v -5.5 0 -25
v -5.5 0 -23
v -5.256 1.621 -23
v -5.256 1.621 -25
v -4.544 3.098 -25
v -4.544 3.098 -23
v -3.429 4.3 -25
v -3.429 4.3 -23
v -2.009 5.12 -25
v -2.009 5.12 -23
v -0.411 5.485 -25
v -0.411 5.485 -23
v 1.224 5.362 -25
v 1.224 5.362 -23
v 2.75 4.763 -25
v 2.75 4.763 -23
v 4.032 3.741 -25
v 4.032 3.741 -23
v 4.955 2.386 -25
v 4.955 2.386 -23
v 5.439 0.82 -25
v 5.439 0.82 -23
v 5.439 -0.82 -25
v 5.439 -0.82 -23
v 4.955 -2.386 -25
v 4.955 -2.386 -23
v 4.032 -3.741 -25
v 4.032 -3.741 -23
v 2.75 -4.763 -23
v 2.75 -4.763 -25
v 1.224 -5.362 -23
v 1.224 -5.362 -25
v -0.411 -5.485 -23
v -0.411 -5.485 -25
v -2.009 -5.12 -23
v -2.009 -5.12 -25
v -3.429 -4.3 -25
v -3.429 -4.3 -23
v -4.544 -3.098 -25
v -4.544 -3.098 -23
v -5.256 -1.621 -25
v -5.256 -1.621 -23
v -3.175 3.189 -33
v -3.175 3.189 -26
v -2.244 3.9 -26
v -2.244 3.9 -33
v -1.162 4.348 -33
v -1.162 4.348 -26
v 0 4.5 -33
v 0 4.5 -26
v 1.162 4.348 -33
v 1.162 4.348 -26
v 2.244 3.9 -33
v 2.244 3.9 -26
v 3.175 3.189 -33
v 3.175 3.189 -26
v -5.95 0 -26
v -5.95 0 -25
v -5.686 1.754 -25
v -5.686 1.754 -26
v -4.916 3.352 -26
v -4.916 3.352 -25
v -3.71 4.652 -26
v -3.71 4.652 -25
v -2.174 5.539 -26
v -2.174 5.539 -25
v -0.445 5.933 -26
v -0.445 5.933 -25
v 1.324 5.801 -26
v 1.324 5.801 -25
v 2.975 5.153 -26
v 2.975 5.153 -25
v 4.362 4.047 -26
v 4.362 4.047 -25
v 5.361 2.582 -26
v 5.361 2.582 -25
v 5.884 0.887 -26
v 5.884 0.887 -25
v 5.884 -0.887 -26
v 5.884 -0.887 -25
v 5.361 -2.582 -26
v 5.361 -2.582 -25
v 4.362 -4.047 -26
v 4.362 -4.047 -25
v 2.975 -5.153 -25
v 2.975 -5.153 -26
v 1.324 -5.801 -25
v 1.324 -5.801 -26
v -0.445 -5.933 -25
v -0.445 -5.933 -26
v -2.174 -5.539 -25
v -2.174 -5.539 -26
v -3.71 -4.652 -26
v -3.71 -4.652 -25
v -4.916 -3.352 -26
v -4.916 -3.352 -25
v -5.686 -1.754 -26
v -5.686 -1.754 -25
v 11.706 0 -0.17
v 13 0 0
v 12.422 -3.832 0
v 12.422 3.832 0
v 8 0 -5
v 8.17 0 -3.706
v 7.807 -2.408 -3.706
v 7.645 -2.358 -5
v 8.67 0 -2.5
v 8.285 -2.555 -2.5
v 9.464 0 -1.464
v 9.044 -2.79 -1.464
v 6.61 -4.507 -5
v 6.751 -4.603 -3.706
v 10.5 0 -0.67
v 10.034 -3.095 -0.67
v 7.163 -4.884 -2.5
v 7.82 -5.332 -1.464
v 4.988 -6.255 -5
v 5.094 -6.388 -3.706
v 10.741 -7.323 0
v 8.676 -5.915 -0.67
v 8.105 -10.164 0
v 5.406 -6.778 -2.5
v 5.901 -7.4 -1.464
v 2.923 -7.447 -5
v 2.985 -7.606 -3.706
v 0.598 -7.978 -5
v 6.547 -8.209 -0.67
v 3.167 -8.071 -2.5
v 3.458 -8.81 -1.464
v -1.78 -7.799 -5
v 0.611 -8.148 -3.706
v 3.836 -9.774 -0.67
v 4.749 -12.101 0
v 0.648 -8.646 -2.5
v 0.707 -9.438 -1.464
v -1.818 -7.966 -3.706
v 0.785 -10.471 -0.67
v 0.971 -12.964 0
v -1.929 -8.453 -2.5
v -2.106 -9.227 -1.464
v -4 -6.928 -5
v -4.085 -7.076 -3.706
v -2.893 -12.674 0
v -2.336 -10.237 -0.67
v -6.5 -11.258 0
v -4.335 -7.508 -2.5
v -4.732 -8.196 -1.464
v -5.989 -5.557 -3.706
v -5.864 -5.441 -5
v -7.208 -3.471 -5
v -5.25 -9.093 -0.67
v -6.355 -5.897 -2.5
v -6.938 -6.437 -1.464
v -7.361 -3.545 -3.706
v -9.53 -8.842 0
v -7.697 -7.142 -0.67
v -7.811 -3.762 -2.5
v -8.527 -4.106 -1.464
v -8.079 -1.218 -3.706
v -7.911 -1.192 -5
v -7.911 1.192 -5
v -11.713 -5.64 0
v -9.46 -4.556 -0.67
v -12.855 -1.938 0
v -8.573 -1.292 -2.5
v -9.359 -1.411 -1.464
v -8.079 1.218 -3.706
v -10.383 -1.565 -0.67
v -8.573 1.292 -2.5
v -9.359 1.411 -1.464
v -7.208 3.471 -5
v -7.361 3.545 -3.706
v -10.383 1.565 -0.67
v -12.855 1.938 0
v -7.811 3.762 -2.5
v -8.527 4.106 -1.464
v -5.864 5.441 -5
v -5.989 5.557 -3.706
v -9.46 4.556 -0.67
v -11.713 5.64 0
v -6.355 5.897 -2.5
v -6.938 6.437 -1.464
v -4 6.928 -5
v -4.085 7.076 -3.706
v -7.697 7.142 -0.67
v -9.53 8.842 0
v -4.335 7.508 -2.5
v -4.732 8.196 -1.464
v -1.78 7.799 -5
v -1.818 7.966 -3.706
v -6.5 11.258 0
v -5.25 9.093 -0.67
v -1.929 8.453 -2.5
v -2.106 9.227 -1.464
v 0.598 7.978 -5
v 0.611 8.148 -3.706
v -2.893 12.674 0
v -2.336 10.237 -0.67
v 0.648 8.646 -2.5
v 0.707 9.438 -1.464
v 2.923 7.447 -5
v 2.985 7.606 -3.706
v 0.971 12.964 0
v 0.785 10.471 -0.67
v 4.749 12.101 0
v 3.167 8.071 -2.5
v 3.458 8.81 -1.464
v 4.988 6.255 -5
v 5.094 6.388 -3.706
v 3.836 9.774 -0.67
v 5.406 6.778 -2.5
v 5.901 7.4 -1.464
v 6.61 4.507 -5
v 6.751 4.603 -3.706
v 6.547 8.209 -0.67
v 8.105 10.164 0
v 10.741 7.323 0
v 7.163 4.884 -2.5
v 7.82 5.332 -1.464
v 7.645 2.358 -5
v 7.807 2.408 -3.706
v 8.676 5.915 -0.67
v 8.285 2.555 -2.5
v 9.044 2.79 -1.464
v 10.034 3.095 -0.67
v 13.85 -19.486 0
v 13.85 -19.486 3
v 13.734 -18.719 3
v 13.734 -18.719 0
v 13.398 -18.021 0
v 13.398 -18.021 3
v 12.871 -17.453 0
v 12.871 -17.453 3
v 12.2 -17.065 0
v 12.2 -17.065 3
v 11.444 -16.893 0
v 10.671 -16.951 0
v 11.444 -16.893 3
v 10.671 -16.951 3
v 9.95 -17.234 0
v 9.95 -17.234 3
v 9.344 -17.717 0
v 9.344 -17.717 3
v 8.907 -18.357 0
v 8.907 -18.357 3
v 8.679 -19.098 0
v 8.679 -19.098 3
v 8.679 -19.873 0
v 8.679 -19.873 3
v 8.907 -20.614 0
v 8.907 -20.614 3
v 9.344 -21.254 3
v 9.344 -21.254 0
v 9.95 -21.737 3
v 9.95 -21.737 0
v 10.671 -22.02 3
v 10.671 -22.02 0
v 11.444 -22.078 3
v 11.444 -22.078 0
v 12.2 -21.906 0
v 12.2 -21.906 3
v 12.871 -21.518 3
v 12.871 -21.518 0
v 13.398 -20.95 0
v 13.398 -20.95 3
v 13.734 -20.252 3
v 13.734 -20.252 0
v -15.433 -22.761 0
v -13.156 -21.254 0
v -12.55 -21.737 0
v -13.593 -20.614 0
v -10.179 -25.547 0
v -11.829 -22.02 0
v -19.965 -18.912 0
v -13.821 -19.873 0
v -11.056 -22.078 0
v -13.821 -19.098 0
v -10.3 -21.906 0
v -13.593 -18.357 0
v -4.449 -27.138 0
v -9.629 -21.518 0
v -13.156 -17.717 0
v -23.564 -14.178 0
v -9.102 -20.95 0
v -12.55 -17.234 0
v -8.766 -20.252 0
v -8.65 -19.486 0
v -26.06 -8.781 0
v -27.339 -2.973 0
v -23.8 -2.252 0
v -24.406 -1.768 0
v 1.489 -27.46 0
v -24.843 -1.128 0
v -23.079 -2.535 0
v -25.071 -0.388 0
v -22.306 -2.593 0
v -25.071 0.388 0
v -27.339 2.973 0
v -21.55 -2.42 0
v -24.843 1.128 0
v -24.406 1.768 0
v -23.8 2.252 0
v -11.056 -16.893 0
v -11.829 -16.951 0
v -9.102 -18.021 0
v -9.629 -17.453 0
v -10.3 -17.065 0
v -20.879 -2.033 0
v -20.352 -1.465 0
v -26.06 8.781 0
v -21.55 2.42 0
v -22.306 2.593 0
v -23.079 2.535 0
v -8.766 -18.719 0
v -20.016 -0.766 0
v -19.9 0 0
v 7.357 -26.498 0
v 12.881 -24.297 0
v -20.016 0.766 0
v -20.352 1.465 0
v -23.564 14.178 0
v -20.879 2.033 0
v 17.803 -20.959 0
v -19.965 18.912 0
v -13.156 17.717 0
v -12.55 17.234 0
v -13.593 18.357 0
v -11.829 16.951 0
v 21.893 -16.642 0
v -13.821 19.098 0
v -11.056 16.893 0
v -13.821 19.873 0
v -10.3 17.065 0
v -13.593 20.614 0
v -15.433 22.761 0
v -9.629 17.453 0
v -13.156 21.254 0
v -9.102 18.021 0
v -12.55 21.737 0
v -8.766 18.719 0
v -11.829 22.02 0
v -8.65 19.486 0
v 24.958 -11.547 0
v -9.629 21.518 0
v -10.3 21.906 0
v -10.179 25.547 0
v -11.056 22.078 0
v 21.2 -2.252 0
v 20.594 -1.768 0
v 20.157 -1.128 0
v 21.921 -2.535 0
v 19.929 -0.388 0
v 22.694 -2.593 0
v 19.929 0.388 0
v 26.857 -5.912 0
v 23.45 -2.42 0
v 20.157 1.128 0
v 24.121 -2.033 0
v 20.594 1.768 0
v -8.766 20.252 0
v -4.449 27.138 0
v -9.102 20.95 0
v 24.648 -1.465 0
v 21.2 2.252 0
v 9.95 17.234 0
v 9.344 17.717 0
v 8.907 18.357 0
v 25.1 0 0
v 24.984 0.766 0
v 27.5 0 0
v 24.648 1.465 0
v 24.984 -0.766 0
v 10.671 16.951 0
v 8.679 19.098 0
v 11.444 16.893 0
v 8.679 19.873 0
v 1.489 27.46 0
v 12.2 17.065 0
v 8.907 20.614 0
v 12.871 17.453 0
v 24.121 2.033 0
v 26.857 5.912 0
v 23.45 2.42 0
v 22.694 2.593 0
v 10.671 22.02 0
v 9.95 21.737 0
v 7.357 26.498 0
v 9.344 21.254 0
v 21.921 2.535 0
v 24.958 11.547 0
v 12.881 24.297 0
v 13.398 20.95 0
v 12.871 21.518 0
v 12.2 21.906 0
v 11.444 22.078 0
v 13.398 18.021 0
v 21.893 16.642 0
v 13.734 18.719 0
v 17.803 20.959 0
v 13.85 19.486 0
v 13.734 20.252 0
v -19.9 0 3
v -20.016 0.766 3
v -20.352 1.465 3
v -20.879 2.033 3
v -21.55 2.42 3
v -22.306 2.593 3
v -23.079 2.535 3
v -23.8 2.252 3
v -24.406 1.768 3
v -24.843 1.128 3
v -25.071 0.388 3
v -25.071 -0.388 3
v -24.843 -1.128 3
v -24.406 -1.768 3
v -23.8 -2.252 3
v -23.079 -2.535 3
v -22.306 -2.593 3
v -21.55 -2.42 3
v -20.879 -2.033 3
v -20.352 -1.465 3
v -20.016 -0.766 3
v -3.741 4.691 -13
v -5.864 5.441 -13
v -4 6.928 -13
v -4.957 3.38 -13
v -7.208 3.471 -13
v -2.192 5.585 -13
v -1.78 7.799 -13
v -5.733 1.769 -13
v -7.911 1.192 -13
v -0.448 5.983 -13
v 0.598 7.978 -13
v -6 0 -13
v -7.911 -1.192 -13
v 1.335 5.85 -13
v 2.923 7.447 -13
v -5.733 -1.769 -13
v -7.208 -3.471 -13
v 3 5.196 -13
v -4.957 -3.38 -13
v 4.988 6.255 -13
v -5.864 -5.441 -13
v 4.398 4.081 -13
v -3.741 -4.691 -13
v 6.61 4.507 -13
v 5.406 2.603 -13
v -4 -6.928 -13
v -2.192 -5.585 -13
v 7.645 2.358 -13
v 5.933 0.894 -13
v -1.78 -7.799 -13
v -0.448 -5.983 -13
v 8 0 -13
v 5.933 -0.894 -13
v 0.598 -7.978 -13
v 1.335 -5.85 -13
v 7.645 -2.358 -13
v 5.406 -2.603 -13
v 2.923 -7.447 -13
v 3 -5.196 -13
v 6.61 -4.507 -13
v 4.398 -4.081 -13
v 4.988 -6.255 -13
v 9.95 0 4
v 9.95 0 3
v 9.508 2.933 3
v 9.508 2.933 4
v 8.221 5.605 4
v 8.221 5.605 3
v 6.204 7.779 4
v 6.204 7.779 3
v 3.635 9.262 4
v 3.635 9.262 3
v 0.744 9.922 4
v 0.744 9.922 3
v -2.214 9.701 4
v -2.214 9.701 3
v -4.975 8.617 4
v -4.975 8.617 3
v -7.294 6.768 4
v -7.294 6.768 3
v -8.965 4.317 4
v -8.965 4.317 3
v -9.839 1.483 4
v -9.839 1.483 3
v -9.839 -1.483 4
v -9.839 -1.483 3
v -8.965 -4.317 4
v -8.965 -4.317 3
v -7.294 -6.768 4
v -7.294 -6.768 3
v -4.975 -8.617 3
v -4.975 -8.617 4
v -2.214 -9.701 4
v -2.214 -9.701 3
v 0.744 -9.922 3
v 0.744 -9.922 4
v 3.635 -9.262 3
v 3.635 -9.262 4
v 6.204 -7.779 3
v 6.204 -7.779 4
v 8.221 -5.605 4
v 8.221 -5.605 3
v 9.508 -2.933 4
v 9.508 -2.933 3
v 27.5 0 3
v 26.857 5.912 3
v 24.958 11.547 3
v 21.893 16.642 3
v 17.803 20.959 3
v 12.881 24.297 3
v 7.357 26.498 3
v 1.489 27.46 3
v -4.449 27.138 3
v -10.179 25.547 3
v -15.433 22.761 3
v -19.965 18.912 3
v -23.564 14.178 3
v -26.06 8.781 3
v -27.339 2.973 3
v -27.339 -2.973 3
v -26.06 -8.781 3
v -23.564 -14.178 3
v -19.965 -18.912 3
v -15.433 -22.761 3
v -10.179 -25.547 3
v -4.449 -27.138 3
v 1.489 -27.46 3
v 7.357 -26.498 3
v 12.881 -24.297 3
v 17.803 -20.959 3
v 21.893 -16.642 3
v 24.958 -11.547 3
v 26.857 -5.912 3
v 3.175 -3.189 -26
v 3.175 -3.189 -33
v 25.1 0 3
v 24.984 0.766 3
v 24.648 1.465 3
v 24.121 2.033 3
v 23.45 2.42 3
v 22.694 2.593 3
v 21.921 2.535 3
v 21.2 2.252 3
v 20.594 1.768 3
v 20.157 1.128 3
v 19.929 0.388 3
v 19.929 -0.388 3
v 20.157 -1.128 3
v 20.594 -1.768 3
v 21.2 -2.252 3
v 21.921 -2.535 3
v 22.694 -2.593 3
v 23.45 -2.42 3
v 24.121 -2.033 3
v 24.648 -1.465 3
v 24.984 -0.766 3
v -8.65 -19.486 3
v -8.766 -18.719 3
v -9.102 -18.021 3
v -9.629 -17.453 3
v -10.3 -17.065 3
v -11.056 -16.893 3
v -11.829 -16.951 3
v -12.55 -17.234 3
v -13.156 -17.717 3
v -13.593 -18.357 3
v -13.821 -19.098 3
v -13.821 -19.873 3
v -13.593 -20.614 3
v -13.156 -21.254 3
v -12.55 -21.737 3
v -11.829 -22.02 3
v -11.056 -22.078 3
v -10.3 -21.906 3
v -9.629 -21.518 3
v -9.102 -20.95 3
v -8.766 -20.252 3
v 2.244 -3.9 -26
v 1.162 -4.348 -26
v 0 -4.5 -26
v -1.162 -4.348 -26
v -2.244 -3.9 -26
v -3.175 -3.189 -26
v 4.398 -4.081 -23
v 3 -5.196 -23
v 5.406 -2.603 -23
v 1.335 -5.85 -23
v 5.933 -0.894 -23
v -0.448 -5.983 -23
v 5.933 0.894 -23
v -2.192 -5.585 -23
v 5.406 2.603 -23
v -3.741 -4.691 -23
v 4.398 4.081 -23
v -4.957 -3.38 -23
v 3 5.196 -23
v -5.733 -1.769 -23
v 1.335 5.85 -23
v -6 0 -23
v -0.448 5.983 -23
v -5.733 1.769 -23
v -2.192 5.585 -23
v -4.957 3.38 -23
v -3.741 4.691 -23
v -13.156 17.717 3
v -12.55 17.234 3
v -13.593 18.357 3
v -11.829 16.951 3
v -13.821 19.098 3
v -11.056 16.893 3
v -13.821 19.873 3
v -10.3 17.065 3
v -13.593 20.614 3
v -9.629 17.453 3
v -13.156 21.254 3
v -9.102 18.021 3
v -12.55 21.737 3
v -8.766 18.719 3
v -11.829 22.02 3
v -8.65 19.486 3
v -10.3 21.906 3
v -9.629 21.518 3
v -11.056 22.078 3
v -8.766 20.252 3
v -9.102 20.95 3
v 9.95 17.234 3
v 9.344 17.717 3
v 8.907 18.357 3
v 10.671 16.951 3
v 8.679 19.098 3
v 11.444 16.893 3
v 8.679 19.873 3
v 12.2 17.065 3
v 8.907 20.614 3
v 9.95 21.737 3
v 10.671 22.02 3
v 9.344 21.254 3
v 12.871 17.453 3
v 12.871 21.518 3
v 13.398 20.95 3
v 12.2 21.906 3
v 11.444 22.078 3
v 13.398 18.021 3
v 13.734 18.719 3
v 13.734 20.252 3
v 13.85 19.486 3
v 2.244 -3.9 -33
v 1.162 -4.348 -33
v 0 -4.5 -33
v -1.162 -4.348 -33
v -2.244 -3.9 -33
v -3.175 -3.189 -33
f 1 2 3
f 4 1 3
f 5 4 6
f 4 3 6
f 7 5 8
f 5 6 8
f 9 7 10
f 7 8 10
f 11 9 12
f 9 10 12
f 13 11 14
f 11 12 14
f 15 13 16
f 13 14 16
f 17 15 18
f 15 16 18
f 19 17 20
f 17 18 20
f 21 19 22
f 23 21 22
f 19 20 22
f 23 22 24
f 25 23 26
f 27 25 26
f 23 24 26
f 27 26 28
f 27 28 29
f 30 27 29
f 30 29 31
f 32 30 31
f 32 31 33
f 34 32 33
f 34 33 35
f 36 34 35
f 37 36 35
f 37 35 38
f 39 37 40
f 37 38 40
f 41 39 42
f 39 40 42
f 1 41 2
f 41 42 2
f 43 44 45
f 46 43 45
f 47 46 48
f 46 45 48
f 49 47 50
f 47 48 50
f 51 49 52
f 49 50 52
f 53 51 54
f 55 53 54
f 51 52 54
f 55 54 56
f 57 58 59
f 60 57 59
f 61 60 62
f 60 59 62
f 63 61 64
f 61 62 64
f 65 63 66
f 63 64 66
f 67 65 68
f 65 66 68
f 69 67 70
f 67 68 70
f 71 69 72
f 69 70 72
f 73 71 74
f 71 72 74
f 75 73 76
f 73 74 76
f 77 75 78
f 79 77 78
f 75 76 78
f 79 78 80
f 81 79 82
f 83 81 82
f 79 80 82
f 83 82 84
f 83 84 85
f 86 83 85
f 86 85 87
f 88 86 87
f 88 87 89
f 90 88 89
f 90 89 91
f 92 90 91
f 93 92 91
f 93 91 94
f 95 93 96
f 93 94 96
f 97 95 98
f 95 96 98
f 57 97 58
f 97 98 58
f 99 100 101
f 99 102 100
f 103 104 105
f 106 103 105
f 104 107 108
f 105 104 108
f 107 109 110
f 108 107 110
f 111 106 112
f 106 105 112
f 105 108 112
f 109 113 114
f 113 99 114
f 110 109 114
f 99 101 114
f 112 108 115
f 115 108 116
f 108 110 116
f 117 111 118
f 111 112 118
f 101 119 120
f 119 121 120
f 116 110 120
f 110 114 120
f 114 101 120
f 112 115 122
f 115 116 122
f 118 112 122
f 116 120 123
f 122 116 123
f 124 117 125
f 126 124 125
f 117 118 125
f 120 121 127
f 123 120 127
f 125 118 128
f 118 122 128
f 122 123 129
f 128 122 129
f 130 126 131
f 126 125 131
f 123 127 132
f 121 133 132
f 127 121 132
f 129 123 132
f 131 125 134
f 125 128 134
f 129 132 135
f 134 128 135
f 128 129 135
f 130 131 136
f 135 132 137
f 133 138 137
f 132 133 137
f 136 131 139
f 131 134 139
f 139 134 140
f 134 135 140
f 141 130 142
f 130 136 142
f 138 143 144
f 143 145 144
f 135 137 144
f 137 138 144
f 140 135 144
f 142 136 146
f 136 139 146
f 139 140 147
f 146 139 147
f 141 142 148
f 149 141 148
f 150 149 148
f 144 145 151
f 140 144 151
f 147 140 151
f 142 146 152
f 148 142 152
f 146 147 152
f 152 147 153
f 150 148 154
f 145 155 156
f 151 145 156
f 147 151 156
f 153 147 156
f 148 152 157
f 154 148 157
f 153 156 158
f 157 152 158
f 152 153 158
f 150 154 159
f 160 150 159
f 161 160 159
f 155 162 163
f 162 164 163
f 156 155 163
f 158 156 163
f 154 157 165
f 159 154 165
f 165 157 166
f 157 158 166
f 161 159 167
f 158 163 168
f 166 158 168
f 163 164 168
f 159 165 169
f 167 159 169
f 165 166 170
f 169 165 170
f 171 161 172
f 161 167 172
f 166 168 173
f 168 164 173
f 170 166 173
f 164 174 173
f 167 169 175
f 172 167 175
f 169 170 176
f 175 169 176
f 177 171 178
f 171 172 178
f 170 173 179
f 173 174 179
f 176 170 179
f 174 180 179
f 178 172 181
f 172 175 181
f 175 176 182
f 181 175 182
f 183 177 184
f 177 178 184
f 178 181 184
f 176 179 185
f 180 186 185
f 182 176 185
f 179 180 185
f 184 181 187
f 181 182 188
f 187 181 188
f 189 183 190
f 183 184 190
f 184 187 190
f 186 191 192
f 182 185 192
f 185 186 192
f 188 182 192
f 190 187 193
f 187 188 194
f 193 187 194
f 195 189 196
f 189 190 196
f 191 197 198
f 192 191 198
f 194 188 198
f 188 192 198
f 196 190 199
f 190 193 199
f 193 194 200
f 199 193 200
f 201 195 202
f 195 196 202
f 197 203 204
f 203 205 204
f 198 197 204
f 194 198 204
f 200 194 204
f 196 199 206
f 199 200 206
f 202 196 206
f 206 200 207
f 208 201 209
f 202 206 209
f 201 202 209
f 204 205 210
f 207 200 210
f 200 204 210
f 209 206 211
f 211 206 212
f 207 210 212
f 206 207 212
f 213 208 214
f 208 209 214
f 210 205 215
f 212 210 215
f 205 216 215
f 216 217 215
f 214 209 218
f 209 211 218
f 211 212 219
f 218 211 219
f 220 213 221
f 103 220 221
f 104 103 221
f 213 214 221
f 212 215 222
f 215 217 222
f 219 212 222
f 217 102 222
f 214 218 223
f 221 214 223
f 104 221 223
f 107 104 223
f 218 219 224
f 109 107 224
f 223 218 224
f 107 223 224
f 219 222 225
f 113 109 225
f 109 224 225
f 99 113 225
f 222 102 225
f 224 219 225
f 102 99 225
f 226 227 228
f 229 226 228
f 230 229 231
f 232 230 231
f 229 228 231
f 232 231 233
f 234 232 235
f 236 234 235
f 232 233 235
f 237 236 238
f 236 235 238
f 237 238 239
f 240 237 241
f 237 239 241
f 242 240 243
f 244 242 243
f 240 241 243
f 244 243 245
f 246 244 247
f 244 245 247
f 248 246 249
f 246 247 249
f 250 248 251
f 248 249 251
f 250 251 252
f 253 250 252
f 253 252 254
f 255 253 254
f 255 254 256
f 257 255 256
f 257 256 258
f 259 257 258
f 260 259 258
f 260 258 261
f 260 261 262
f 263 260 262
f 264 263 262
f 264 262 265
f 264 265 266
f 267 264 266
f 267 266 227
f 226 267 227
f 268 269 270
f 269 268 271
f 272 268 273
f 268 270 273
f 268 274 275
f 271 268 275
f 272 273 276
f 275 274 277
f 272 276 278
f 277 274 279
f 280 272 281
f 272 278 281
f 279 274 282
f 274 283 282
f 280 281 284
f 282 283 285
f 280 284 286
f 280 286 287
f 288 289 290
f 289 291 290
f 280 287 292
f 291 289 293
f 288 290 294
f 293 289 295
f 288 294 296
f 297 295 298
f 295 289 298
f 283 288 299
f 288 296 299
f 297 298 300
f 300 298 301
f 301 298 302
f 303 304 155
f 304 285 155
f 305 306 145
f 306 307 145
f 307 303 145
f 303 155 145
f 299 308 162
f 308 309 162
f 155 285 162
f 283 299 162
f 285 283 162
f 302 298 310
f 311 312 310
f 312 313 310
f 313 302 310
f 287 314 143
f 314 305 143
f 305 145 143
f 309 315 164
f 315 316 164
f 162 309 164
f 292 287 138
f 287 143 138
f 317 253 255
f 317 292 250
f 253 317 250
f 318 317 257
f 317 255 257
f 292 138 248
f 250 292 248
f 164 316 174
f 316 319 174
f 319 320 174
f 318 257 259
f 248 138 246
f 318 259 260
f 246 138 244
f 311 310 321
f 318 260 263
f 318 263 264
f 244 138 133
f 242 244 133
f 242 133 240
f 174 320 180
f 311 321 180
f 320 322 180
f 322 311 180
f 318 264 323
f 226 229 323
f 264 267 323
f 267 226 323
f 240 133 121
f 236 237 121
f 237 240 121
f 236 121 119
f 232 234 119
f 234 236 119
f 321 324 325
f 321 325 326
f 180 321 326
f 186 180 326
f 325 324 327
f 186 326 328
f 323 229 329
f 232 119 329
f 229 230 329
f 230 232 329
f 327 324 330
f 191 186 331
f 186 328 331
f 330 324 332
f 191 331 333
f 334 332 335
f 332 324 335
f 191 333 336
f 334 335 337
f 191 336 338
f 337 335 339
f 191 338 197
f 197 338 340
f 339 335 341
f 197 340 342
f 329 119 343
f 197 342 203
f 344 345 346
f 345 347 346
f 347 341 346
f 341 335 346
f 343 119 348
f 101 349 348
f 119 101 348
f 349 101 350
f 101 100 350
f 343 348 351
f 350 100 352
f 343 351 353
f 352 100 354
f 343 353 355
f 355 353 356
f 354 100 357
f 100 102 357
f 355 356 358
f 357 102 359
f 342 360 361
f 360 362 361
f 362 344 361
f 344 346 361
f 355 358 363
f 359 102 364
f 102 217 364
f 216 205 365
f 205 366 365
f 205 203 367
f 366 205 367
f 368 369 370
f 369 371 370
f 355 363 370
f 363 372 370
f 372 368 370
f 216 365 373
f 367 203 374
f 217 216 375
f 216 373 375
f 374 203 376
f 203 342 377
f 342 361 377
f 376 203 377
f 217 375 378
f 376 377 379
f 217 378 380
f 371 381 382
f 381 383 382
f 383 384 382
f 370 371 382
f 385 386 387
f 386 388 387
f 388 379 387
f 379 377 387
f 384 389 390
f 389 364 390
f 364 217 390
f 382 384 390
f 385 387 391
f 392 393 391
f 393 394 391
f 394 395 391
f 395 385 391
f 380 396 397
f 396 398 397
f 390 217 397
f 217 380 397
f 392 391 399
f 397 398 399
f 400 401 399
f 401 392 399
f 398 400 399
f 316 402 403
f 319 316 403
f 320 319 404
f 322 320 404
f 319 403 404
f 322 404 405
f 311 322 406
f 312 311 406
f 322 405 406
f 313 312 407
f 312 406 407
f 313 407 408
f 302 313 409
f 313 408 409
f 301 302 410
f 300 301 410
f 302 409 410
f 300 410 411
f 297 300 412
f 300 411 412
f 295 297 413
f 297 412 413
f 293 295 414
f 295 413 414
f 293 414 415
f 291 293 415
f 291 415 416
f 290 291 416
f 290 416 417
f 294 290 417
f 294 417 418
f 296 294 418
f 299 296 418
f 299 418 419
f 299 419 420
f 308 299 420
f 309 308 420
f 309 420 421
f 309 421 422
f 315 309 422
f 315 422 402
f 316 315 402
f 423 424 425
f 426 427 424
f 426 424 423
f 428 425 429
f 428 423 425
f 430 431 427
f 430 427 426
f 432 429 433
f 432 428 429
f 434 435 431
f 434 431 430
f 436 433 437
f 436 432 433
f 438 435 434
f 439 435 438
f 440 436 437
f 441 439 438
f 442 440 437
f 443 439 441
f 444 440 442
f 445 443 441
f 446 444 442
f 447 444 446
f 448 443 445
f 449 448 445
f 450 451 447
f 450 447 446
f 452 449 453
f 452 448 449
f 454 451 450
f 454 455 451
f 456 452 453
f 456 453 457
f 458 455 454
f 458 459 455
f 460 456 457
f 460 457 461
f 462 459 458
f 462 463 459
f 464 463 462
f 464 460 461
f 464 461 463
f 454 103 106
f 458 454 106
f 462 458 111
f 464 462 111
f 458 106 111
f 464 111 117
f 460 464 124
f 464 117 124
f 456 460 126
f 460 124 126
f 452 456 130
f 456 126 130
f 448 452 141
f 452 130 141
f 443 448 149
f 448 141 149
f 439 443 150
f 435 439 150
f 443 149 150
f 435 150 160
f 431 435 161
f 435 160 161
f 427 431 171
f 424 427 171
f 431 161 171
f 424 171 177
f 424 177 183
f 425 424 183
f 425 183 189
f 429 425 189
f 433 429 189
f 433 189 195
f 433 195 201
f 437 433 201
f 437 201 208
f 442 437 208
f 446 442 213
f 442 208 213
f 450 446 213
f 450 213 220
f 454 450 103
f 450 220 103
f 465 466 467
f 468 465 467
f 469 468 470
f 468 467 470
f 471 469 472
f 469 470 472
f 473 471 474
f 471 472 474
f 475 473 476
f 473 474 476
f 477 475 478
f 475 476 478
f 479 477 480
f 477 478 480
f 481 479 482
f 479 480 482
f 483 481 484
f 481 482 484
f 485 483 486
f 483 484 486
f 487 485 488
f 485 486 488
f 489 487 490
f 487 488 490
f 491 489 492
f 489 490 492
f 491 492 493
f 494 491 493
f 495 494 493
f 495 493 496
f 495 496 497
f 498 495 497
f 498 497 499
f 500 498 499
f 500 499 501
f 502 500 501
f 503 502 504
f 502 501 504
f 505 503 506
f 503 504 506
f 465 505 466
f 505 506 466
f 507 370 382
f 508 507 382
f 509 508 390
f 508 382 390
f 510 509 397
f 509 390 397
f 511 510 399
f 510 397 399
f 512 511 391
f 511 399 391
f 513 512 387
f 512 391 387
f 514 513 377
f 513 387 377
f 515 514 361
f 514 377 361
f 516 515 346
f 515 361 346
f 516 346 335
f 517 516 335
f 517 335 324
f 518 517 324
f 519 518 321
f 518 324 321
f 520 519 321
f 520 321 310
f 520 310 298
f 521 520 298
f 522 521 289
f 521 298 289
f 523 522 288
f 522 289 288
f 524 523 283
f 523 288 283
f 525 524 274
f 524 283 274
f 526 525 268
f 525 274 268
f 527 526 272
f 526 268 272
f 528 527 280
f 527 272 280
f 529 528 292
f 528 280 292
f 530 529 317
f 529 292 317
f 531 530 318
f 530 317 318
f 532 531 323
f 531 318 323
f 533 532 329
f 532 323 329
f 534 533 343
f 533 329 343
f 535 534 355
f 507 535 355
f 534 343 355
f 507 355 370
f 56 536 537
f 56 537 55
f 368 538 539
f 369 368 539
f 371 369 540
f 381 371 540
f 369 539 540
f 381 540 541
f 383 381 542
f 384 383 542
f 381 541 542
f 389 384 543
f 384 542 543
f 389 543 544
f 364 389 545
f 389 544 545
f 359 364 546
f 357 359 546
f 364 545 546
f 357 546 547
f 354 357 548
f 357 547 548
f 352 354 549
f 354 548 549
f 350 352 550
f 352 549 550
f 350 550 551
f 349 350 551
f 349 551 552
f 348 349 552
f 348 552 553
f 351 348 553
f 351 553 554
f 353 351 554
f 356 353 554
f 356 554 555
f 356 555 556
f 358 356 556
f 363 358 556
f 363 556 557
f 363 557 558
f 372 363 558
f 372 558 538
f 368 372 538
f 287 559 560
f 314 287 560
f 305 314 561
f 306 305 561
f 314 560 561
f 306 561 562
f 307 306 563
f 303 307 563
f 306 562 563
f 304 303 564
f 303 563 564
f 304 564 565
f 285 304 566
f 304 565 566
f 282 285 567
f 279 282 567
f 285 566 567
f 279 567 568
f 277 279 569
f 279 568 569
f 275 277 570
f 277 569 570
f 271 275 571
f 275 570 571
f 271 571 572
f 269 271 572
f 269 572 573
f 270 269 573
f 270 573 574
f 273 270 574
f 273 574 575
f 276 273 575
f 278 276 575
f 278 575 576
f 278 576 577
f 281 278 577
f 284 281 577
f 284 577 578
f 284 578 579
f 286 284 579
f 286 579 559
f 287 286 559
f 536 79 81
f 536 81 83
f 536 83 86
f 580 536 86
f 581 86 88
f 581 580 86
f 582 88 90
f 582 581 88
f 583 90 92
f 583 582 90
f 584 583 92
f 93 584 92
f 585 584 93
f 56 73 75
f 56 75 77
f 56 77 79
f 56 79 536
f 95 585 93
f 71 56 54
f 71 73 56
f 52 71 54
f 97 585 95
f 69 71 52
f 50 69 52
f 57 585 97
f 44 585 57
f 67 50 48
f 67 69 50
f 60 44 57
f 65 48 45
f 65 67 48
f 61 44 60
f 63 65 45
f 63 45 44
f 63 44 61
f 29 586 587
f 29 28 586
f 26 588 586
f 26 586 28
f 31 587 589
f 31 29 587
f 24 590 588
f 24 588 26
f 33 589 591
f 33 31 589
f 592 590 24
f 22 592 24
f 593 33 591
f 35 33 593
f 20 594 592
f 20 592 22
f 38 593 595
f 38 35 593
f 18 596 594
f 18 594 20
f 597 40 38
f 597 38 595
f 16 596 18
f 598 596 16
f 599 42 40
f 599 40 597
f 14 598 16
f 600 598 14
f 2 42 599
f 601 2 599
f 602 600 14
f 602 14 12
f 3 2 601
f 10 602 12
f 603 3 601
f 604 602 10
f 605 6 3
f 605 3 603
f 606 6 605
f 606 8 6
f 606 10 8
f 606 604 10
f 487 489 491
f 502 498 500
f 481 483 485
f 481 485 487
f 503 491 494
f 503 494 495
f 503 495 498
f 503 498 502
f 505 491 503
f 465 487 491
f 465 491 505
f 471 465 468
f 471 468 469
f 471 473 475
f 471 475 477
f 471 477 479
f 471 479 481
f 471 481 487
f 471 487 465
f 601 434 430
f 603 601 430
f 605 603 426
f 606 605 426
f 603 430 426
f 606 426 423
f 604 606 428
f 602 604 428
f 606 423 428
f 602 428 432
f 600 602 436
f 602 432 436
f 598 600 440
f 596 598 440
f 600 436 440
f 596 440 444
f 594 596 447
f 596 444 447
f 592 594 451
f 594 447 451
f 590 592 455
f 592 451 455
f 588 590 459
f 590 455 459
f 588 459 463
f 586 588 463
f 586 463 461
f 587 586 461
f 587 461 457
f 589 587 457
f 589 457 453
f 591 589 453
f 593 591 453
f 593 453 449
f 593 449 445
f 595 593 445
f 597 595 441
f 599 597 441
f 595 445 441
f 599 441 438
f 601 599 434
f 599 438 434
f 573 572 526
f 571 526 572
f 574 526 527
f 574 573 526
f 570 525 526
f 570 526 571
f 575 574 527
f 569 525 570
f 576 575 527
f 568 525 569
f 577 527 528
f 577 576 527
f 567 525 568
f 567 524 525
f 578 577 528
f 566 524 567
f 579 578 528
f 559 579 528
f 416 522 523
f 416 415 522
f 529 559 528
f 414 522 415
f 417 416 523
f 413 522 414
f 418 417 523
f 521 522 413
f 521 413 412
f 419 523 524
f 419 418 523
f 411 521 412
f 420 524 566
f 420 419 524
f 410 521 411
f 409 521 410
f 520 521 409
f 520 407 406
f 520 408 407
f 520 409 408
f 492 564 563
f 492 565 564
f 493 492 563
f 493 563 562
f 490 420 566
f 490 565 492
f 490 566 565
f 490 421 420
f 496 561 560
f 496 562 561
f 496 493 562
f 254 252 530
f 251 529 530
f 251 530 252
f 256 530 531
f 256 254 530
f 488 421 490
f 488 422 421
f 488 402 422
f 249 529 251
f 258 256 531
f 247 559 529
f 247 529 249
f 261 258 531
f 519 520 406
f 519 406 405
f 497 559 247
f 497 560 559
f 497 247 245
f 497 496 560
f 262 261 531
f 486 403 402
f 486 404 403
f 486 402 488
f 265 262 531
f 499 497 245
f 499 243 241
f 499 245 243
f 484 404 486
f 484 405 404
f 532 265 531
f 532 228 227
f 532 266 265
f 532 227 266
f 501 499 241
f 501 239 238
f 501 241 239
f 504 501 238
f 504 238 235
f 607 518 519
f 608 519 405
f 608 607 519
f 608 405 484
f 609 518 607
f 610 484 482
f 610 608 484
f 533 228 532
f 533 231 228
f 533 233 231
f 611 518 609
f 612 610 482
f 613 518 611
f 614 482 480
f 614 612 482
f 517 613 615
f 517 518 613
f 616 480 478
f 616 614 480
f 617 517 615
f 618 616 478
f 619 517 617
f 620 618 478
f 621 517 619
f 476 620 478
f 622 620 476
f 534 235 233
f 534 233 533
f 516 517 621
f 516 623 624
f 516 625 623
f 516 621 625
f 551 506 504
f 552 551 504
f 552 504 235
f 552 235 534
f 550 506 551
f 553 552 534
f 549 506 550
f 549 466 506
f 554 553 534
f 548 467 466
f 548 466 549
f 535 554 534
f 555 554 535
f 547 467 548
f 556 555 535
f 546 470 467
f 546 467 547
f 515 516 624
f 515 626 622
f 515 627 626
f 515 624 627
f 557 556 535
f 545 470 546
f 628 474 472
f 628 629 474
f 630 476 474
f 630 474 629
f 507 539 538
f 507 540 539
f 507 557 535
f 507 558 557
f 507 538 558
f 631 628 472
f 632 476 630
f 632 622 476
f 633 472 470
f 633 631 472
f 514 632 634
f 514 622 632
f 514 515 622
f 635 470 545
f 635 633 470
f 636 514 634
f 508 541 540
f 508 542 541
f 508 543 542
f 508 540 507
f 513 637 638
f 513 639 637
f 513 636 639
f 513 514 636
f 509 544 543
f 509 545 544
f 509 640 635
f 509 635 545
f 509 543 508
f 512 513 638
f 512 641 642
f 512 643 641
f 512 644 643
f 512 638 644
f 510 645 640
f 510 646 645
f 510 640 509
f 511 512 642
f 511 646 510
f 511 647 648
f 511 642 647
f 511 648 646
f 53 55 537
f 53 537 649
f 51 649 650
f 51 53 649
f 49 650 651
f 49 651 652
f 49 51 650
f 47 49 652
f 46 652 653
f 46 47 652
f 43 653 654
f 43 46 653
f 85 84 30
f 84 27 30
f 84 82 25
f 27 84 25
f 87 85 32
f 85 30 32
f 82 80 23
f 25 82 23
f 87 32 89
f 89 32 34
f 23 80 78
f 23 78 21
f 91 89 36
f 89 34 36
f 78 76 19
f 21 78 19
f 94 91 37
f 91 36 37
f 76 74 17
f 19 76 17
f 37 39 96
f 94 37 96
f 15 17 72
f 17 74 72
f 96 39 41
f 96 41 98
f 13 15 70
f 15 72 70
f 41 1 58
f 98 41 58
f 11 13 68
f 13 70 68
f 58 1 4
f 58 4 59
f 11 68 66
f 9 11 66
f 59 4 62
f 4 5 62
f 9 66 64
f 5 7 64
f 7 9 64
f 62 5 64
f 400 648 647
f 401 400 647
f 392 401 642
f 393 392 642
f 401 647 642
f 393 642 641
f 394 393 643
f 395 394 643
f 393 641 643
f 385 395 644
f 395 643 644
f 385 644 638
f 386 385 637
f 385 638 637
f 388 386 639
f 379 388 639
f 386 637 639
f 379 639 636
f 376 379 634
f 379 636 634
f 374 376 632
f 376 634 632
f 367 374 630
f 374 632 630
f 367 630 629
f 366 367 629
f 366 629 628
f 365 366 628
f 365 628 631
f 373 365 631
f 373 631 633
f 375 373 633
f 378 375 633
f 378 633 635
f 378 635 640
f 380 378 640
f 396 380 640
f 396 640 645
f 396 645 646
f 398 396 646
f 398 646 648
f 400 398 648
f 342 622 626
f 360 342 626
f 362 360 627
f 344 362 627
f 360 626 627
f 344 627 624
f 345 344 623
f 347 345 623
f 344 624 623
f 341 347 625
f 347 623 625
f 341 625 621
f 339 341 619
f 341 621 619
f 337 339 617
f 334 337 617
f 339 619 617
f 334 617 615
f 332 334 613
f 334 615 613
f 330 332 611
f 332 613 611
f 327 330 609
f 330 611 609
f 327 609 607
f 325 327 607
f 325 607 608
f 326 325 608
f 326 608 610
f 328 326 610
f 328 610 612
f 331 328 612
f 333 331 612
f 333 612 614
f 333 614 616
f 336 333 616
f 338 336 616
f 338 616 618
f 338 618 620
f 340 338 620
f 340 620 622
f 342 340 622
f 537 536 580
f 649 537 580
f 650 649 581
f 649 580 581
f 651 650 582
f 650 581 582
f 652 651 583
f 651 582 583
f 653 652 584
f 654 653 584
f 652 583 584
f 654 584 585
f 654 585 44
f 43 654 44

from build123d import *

# Parameters (mm, degrees)
SKETCH_1_R          = 27.5
EXTRUDE_1_DEPTH     = 3
SKETCH_2_R          = 2.6
CUT_EXTRUDE_1_DEPTH = 5
SKETCH_3_R          = 9.95
EXTRUDE_2_DEPTH     = 1
SKETCH_4_R          = 8
EXTRUDE_3_DEPTH     = 13
SKETCH_5_R          = 6
EXTRUDE_4_DEPTH     = 10
SKETCH_6_R          = 5.5
EXTRUDE_5_DEPTH     = 2
SKETCH_7_R          = 5.95
EXTRUDE_6_DEPTH     = 1
FILLET_1_R          = 5
SKETCH_8_W          = 6.35
SKETCH_8_H          = 6.377891502
EXTRUDE_7_DEPTH     = 7


with BuildPart() as part:
    # 草图1 → 凸台-拉伸1 (new body)
    with BuildSketch(Plane.XY):
        Circle(SKETCH_1_R)
    extrude(amount=EXTRUDE_1_DEPTH)

    # 草图2 → 切除-拉伸1 (cut)
    with BuildSketch(Plane.XY.offset(3)):
        with Locations((22.5, 0)):
            Circle(SKETCH_2_R)
        with Locations((11.25, -19.485571585)):
            Circle(SKETCH_2_R)
        with Locations((-11.25, -19.485571585)):
            Circle(SKETCH_2_R)
        with Locations((-22.5, 0)):
            Circle(SKETCH_2_R)
        with Locations((-11.25, 19.485571585)):
            Circle(SKETCH_2_R)
        with Locations((11.25, 19.485571585)):
            Circle(SKETCH_2_R)
    extrude(amount=-CUT_EXTRUDE_1_DEPTH, mode=Mode.SUBTRACT)

    # 草图3 → 凸台-拉伸2 (add)
    with BuildSketch(Plane.XY.offset(3)):
        Circle(SKETCH_3_R)
    extrude(amount=EXTRUDE_2_DEPTH)

    # 草图4 → 凸台-拉伸3 (add)
    with BuildSketch(Plane(origin=(0, 0, 0), x_dir=(-1, 0, 0), z_dir=(0, 0, -1))):
        with Locations(Location((0, 0, 0), (0, 0, 180))):
            Circle(SKETCH_4_R)
    extrude(amount=EXTRUDE_3_DEPTH)

    # 草图5 → 凸台-拉伸4 (add)
    with BuildSketch(Plane(origin=(0, 0, -13), x_dir=(-1, 0, 0), z_dir=(0, 0, -1))):
        Circle(SKETCH_5_R)
    extrude(amount=EXTRUDE_4_DEPTH)

    # 草图6 → 凸台-拉伸5 (add)
    with BuildSketch(Plane(origin=(0, 0, -23), x_dir=(-1, 0, 0), z_dir=(0, 0, -1))):
        Circle(SKETCH_6_R)
    extrude(amount=EXTRUDE_5_DEPTH)

    # 草图7 → 凸台-拉伸6 (add)
    with BuildSketch(Plane(origin=(0, 0, -25), x_dir=(-1, 0, 0), z_dir=(0, 0, -1))):
        Circle(SKETCH_7_R)
    extrude(amount=EXTRUDE_6_DEPTH)

    # 圆角1
    fillet_1_edges = [part.edges().sort_by_distance(p)[0] for p in [
        (-8, 0, 0),
    ]]
    fillet(fillet_1_edges, radius=FILLET_1_R)

    # 草图8 → 凸台-拉伸7 (add)
    with BuildSketch(Plane(origin=(0, 0, -26), x_dir=(-1, 0, 0), z_dir=(0, 0, -1))):
        Rectangle(SKETCH_8_W, SKETCH_8_H)
        with BuildLine():
            Line((3.175, -3.188945751), (-3.175, -3.188945751))
            ThreePointArc((-3.175, -3.188945751), (0, -4.5), (3.175, -3.188945751))
        make_face()
        with BuildLine():
            ThreePointArc((3.175, 3.188945751), (0, 4.5), (-3.175, 3.188945751))
            Line((-3.175, 3.188945751), (3.175, 3.188945751))
        make_face()
    extrude(amount=EXTRUDE_7_DEPTH)


solid = part.part
